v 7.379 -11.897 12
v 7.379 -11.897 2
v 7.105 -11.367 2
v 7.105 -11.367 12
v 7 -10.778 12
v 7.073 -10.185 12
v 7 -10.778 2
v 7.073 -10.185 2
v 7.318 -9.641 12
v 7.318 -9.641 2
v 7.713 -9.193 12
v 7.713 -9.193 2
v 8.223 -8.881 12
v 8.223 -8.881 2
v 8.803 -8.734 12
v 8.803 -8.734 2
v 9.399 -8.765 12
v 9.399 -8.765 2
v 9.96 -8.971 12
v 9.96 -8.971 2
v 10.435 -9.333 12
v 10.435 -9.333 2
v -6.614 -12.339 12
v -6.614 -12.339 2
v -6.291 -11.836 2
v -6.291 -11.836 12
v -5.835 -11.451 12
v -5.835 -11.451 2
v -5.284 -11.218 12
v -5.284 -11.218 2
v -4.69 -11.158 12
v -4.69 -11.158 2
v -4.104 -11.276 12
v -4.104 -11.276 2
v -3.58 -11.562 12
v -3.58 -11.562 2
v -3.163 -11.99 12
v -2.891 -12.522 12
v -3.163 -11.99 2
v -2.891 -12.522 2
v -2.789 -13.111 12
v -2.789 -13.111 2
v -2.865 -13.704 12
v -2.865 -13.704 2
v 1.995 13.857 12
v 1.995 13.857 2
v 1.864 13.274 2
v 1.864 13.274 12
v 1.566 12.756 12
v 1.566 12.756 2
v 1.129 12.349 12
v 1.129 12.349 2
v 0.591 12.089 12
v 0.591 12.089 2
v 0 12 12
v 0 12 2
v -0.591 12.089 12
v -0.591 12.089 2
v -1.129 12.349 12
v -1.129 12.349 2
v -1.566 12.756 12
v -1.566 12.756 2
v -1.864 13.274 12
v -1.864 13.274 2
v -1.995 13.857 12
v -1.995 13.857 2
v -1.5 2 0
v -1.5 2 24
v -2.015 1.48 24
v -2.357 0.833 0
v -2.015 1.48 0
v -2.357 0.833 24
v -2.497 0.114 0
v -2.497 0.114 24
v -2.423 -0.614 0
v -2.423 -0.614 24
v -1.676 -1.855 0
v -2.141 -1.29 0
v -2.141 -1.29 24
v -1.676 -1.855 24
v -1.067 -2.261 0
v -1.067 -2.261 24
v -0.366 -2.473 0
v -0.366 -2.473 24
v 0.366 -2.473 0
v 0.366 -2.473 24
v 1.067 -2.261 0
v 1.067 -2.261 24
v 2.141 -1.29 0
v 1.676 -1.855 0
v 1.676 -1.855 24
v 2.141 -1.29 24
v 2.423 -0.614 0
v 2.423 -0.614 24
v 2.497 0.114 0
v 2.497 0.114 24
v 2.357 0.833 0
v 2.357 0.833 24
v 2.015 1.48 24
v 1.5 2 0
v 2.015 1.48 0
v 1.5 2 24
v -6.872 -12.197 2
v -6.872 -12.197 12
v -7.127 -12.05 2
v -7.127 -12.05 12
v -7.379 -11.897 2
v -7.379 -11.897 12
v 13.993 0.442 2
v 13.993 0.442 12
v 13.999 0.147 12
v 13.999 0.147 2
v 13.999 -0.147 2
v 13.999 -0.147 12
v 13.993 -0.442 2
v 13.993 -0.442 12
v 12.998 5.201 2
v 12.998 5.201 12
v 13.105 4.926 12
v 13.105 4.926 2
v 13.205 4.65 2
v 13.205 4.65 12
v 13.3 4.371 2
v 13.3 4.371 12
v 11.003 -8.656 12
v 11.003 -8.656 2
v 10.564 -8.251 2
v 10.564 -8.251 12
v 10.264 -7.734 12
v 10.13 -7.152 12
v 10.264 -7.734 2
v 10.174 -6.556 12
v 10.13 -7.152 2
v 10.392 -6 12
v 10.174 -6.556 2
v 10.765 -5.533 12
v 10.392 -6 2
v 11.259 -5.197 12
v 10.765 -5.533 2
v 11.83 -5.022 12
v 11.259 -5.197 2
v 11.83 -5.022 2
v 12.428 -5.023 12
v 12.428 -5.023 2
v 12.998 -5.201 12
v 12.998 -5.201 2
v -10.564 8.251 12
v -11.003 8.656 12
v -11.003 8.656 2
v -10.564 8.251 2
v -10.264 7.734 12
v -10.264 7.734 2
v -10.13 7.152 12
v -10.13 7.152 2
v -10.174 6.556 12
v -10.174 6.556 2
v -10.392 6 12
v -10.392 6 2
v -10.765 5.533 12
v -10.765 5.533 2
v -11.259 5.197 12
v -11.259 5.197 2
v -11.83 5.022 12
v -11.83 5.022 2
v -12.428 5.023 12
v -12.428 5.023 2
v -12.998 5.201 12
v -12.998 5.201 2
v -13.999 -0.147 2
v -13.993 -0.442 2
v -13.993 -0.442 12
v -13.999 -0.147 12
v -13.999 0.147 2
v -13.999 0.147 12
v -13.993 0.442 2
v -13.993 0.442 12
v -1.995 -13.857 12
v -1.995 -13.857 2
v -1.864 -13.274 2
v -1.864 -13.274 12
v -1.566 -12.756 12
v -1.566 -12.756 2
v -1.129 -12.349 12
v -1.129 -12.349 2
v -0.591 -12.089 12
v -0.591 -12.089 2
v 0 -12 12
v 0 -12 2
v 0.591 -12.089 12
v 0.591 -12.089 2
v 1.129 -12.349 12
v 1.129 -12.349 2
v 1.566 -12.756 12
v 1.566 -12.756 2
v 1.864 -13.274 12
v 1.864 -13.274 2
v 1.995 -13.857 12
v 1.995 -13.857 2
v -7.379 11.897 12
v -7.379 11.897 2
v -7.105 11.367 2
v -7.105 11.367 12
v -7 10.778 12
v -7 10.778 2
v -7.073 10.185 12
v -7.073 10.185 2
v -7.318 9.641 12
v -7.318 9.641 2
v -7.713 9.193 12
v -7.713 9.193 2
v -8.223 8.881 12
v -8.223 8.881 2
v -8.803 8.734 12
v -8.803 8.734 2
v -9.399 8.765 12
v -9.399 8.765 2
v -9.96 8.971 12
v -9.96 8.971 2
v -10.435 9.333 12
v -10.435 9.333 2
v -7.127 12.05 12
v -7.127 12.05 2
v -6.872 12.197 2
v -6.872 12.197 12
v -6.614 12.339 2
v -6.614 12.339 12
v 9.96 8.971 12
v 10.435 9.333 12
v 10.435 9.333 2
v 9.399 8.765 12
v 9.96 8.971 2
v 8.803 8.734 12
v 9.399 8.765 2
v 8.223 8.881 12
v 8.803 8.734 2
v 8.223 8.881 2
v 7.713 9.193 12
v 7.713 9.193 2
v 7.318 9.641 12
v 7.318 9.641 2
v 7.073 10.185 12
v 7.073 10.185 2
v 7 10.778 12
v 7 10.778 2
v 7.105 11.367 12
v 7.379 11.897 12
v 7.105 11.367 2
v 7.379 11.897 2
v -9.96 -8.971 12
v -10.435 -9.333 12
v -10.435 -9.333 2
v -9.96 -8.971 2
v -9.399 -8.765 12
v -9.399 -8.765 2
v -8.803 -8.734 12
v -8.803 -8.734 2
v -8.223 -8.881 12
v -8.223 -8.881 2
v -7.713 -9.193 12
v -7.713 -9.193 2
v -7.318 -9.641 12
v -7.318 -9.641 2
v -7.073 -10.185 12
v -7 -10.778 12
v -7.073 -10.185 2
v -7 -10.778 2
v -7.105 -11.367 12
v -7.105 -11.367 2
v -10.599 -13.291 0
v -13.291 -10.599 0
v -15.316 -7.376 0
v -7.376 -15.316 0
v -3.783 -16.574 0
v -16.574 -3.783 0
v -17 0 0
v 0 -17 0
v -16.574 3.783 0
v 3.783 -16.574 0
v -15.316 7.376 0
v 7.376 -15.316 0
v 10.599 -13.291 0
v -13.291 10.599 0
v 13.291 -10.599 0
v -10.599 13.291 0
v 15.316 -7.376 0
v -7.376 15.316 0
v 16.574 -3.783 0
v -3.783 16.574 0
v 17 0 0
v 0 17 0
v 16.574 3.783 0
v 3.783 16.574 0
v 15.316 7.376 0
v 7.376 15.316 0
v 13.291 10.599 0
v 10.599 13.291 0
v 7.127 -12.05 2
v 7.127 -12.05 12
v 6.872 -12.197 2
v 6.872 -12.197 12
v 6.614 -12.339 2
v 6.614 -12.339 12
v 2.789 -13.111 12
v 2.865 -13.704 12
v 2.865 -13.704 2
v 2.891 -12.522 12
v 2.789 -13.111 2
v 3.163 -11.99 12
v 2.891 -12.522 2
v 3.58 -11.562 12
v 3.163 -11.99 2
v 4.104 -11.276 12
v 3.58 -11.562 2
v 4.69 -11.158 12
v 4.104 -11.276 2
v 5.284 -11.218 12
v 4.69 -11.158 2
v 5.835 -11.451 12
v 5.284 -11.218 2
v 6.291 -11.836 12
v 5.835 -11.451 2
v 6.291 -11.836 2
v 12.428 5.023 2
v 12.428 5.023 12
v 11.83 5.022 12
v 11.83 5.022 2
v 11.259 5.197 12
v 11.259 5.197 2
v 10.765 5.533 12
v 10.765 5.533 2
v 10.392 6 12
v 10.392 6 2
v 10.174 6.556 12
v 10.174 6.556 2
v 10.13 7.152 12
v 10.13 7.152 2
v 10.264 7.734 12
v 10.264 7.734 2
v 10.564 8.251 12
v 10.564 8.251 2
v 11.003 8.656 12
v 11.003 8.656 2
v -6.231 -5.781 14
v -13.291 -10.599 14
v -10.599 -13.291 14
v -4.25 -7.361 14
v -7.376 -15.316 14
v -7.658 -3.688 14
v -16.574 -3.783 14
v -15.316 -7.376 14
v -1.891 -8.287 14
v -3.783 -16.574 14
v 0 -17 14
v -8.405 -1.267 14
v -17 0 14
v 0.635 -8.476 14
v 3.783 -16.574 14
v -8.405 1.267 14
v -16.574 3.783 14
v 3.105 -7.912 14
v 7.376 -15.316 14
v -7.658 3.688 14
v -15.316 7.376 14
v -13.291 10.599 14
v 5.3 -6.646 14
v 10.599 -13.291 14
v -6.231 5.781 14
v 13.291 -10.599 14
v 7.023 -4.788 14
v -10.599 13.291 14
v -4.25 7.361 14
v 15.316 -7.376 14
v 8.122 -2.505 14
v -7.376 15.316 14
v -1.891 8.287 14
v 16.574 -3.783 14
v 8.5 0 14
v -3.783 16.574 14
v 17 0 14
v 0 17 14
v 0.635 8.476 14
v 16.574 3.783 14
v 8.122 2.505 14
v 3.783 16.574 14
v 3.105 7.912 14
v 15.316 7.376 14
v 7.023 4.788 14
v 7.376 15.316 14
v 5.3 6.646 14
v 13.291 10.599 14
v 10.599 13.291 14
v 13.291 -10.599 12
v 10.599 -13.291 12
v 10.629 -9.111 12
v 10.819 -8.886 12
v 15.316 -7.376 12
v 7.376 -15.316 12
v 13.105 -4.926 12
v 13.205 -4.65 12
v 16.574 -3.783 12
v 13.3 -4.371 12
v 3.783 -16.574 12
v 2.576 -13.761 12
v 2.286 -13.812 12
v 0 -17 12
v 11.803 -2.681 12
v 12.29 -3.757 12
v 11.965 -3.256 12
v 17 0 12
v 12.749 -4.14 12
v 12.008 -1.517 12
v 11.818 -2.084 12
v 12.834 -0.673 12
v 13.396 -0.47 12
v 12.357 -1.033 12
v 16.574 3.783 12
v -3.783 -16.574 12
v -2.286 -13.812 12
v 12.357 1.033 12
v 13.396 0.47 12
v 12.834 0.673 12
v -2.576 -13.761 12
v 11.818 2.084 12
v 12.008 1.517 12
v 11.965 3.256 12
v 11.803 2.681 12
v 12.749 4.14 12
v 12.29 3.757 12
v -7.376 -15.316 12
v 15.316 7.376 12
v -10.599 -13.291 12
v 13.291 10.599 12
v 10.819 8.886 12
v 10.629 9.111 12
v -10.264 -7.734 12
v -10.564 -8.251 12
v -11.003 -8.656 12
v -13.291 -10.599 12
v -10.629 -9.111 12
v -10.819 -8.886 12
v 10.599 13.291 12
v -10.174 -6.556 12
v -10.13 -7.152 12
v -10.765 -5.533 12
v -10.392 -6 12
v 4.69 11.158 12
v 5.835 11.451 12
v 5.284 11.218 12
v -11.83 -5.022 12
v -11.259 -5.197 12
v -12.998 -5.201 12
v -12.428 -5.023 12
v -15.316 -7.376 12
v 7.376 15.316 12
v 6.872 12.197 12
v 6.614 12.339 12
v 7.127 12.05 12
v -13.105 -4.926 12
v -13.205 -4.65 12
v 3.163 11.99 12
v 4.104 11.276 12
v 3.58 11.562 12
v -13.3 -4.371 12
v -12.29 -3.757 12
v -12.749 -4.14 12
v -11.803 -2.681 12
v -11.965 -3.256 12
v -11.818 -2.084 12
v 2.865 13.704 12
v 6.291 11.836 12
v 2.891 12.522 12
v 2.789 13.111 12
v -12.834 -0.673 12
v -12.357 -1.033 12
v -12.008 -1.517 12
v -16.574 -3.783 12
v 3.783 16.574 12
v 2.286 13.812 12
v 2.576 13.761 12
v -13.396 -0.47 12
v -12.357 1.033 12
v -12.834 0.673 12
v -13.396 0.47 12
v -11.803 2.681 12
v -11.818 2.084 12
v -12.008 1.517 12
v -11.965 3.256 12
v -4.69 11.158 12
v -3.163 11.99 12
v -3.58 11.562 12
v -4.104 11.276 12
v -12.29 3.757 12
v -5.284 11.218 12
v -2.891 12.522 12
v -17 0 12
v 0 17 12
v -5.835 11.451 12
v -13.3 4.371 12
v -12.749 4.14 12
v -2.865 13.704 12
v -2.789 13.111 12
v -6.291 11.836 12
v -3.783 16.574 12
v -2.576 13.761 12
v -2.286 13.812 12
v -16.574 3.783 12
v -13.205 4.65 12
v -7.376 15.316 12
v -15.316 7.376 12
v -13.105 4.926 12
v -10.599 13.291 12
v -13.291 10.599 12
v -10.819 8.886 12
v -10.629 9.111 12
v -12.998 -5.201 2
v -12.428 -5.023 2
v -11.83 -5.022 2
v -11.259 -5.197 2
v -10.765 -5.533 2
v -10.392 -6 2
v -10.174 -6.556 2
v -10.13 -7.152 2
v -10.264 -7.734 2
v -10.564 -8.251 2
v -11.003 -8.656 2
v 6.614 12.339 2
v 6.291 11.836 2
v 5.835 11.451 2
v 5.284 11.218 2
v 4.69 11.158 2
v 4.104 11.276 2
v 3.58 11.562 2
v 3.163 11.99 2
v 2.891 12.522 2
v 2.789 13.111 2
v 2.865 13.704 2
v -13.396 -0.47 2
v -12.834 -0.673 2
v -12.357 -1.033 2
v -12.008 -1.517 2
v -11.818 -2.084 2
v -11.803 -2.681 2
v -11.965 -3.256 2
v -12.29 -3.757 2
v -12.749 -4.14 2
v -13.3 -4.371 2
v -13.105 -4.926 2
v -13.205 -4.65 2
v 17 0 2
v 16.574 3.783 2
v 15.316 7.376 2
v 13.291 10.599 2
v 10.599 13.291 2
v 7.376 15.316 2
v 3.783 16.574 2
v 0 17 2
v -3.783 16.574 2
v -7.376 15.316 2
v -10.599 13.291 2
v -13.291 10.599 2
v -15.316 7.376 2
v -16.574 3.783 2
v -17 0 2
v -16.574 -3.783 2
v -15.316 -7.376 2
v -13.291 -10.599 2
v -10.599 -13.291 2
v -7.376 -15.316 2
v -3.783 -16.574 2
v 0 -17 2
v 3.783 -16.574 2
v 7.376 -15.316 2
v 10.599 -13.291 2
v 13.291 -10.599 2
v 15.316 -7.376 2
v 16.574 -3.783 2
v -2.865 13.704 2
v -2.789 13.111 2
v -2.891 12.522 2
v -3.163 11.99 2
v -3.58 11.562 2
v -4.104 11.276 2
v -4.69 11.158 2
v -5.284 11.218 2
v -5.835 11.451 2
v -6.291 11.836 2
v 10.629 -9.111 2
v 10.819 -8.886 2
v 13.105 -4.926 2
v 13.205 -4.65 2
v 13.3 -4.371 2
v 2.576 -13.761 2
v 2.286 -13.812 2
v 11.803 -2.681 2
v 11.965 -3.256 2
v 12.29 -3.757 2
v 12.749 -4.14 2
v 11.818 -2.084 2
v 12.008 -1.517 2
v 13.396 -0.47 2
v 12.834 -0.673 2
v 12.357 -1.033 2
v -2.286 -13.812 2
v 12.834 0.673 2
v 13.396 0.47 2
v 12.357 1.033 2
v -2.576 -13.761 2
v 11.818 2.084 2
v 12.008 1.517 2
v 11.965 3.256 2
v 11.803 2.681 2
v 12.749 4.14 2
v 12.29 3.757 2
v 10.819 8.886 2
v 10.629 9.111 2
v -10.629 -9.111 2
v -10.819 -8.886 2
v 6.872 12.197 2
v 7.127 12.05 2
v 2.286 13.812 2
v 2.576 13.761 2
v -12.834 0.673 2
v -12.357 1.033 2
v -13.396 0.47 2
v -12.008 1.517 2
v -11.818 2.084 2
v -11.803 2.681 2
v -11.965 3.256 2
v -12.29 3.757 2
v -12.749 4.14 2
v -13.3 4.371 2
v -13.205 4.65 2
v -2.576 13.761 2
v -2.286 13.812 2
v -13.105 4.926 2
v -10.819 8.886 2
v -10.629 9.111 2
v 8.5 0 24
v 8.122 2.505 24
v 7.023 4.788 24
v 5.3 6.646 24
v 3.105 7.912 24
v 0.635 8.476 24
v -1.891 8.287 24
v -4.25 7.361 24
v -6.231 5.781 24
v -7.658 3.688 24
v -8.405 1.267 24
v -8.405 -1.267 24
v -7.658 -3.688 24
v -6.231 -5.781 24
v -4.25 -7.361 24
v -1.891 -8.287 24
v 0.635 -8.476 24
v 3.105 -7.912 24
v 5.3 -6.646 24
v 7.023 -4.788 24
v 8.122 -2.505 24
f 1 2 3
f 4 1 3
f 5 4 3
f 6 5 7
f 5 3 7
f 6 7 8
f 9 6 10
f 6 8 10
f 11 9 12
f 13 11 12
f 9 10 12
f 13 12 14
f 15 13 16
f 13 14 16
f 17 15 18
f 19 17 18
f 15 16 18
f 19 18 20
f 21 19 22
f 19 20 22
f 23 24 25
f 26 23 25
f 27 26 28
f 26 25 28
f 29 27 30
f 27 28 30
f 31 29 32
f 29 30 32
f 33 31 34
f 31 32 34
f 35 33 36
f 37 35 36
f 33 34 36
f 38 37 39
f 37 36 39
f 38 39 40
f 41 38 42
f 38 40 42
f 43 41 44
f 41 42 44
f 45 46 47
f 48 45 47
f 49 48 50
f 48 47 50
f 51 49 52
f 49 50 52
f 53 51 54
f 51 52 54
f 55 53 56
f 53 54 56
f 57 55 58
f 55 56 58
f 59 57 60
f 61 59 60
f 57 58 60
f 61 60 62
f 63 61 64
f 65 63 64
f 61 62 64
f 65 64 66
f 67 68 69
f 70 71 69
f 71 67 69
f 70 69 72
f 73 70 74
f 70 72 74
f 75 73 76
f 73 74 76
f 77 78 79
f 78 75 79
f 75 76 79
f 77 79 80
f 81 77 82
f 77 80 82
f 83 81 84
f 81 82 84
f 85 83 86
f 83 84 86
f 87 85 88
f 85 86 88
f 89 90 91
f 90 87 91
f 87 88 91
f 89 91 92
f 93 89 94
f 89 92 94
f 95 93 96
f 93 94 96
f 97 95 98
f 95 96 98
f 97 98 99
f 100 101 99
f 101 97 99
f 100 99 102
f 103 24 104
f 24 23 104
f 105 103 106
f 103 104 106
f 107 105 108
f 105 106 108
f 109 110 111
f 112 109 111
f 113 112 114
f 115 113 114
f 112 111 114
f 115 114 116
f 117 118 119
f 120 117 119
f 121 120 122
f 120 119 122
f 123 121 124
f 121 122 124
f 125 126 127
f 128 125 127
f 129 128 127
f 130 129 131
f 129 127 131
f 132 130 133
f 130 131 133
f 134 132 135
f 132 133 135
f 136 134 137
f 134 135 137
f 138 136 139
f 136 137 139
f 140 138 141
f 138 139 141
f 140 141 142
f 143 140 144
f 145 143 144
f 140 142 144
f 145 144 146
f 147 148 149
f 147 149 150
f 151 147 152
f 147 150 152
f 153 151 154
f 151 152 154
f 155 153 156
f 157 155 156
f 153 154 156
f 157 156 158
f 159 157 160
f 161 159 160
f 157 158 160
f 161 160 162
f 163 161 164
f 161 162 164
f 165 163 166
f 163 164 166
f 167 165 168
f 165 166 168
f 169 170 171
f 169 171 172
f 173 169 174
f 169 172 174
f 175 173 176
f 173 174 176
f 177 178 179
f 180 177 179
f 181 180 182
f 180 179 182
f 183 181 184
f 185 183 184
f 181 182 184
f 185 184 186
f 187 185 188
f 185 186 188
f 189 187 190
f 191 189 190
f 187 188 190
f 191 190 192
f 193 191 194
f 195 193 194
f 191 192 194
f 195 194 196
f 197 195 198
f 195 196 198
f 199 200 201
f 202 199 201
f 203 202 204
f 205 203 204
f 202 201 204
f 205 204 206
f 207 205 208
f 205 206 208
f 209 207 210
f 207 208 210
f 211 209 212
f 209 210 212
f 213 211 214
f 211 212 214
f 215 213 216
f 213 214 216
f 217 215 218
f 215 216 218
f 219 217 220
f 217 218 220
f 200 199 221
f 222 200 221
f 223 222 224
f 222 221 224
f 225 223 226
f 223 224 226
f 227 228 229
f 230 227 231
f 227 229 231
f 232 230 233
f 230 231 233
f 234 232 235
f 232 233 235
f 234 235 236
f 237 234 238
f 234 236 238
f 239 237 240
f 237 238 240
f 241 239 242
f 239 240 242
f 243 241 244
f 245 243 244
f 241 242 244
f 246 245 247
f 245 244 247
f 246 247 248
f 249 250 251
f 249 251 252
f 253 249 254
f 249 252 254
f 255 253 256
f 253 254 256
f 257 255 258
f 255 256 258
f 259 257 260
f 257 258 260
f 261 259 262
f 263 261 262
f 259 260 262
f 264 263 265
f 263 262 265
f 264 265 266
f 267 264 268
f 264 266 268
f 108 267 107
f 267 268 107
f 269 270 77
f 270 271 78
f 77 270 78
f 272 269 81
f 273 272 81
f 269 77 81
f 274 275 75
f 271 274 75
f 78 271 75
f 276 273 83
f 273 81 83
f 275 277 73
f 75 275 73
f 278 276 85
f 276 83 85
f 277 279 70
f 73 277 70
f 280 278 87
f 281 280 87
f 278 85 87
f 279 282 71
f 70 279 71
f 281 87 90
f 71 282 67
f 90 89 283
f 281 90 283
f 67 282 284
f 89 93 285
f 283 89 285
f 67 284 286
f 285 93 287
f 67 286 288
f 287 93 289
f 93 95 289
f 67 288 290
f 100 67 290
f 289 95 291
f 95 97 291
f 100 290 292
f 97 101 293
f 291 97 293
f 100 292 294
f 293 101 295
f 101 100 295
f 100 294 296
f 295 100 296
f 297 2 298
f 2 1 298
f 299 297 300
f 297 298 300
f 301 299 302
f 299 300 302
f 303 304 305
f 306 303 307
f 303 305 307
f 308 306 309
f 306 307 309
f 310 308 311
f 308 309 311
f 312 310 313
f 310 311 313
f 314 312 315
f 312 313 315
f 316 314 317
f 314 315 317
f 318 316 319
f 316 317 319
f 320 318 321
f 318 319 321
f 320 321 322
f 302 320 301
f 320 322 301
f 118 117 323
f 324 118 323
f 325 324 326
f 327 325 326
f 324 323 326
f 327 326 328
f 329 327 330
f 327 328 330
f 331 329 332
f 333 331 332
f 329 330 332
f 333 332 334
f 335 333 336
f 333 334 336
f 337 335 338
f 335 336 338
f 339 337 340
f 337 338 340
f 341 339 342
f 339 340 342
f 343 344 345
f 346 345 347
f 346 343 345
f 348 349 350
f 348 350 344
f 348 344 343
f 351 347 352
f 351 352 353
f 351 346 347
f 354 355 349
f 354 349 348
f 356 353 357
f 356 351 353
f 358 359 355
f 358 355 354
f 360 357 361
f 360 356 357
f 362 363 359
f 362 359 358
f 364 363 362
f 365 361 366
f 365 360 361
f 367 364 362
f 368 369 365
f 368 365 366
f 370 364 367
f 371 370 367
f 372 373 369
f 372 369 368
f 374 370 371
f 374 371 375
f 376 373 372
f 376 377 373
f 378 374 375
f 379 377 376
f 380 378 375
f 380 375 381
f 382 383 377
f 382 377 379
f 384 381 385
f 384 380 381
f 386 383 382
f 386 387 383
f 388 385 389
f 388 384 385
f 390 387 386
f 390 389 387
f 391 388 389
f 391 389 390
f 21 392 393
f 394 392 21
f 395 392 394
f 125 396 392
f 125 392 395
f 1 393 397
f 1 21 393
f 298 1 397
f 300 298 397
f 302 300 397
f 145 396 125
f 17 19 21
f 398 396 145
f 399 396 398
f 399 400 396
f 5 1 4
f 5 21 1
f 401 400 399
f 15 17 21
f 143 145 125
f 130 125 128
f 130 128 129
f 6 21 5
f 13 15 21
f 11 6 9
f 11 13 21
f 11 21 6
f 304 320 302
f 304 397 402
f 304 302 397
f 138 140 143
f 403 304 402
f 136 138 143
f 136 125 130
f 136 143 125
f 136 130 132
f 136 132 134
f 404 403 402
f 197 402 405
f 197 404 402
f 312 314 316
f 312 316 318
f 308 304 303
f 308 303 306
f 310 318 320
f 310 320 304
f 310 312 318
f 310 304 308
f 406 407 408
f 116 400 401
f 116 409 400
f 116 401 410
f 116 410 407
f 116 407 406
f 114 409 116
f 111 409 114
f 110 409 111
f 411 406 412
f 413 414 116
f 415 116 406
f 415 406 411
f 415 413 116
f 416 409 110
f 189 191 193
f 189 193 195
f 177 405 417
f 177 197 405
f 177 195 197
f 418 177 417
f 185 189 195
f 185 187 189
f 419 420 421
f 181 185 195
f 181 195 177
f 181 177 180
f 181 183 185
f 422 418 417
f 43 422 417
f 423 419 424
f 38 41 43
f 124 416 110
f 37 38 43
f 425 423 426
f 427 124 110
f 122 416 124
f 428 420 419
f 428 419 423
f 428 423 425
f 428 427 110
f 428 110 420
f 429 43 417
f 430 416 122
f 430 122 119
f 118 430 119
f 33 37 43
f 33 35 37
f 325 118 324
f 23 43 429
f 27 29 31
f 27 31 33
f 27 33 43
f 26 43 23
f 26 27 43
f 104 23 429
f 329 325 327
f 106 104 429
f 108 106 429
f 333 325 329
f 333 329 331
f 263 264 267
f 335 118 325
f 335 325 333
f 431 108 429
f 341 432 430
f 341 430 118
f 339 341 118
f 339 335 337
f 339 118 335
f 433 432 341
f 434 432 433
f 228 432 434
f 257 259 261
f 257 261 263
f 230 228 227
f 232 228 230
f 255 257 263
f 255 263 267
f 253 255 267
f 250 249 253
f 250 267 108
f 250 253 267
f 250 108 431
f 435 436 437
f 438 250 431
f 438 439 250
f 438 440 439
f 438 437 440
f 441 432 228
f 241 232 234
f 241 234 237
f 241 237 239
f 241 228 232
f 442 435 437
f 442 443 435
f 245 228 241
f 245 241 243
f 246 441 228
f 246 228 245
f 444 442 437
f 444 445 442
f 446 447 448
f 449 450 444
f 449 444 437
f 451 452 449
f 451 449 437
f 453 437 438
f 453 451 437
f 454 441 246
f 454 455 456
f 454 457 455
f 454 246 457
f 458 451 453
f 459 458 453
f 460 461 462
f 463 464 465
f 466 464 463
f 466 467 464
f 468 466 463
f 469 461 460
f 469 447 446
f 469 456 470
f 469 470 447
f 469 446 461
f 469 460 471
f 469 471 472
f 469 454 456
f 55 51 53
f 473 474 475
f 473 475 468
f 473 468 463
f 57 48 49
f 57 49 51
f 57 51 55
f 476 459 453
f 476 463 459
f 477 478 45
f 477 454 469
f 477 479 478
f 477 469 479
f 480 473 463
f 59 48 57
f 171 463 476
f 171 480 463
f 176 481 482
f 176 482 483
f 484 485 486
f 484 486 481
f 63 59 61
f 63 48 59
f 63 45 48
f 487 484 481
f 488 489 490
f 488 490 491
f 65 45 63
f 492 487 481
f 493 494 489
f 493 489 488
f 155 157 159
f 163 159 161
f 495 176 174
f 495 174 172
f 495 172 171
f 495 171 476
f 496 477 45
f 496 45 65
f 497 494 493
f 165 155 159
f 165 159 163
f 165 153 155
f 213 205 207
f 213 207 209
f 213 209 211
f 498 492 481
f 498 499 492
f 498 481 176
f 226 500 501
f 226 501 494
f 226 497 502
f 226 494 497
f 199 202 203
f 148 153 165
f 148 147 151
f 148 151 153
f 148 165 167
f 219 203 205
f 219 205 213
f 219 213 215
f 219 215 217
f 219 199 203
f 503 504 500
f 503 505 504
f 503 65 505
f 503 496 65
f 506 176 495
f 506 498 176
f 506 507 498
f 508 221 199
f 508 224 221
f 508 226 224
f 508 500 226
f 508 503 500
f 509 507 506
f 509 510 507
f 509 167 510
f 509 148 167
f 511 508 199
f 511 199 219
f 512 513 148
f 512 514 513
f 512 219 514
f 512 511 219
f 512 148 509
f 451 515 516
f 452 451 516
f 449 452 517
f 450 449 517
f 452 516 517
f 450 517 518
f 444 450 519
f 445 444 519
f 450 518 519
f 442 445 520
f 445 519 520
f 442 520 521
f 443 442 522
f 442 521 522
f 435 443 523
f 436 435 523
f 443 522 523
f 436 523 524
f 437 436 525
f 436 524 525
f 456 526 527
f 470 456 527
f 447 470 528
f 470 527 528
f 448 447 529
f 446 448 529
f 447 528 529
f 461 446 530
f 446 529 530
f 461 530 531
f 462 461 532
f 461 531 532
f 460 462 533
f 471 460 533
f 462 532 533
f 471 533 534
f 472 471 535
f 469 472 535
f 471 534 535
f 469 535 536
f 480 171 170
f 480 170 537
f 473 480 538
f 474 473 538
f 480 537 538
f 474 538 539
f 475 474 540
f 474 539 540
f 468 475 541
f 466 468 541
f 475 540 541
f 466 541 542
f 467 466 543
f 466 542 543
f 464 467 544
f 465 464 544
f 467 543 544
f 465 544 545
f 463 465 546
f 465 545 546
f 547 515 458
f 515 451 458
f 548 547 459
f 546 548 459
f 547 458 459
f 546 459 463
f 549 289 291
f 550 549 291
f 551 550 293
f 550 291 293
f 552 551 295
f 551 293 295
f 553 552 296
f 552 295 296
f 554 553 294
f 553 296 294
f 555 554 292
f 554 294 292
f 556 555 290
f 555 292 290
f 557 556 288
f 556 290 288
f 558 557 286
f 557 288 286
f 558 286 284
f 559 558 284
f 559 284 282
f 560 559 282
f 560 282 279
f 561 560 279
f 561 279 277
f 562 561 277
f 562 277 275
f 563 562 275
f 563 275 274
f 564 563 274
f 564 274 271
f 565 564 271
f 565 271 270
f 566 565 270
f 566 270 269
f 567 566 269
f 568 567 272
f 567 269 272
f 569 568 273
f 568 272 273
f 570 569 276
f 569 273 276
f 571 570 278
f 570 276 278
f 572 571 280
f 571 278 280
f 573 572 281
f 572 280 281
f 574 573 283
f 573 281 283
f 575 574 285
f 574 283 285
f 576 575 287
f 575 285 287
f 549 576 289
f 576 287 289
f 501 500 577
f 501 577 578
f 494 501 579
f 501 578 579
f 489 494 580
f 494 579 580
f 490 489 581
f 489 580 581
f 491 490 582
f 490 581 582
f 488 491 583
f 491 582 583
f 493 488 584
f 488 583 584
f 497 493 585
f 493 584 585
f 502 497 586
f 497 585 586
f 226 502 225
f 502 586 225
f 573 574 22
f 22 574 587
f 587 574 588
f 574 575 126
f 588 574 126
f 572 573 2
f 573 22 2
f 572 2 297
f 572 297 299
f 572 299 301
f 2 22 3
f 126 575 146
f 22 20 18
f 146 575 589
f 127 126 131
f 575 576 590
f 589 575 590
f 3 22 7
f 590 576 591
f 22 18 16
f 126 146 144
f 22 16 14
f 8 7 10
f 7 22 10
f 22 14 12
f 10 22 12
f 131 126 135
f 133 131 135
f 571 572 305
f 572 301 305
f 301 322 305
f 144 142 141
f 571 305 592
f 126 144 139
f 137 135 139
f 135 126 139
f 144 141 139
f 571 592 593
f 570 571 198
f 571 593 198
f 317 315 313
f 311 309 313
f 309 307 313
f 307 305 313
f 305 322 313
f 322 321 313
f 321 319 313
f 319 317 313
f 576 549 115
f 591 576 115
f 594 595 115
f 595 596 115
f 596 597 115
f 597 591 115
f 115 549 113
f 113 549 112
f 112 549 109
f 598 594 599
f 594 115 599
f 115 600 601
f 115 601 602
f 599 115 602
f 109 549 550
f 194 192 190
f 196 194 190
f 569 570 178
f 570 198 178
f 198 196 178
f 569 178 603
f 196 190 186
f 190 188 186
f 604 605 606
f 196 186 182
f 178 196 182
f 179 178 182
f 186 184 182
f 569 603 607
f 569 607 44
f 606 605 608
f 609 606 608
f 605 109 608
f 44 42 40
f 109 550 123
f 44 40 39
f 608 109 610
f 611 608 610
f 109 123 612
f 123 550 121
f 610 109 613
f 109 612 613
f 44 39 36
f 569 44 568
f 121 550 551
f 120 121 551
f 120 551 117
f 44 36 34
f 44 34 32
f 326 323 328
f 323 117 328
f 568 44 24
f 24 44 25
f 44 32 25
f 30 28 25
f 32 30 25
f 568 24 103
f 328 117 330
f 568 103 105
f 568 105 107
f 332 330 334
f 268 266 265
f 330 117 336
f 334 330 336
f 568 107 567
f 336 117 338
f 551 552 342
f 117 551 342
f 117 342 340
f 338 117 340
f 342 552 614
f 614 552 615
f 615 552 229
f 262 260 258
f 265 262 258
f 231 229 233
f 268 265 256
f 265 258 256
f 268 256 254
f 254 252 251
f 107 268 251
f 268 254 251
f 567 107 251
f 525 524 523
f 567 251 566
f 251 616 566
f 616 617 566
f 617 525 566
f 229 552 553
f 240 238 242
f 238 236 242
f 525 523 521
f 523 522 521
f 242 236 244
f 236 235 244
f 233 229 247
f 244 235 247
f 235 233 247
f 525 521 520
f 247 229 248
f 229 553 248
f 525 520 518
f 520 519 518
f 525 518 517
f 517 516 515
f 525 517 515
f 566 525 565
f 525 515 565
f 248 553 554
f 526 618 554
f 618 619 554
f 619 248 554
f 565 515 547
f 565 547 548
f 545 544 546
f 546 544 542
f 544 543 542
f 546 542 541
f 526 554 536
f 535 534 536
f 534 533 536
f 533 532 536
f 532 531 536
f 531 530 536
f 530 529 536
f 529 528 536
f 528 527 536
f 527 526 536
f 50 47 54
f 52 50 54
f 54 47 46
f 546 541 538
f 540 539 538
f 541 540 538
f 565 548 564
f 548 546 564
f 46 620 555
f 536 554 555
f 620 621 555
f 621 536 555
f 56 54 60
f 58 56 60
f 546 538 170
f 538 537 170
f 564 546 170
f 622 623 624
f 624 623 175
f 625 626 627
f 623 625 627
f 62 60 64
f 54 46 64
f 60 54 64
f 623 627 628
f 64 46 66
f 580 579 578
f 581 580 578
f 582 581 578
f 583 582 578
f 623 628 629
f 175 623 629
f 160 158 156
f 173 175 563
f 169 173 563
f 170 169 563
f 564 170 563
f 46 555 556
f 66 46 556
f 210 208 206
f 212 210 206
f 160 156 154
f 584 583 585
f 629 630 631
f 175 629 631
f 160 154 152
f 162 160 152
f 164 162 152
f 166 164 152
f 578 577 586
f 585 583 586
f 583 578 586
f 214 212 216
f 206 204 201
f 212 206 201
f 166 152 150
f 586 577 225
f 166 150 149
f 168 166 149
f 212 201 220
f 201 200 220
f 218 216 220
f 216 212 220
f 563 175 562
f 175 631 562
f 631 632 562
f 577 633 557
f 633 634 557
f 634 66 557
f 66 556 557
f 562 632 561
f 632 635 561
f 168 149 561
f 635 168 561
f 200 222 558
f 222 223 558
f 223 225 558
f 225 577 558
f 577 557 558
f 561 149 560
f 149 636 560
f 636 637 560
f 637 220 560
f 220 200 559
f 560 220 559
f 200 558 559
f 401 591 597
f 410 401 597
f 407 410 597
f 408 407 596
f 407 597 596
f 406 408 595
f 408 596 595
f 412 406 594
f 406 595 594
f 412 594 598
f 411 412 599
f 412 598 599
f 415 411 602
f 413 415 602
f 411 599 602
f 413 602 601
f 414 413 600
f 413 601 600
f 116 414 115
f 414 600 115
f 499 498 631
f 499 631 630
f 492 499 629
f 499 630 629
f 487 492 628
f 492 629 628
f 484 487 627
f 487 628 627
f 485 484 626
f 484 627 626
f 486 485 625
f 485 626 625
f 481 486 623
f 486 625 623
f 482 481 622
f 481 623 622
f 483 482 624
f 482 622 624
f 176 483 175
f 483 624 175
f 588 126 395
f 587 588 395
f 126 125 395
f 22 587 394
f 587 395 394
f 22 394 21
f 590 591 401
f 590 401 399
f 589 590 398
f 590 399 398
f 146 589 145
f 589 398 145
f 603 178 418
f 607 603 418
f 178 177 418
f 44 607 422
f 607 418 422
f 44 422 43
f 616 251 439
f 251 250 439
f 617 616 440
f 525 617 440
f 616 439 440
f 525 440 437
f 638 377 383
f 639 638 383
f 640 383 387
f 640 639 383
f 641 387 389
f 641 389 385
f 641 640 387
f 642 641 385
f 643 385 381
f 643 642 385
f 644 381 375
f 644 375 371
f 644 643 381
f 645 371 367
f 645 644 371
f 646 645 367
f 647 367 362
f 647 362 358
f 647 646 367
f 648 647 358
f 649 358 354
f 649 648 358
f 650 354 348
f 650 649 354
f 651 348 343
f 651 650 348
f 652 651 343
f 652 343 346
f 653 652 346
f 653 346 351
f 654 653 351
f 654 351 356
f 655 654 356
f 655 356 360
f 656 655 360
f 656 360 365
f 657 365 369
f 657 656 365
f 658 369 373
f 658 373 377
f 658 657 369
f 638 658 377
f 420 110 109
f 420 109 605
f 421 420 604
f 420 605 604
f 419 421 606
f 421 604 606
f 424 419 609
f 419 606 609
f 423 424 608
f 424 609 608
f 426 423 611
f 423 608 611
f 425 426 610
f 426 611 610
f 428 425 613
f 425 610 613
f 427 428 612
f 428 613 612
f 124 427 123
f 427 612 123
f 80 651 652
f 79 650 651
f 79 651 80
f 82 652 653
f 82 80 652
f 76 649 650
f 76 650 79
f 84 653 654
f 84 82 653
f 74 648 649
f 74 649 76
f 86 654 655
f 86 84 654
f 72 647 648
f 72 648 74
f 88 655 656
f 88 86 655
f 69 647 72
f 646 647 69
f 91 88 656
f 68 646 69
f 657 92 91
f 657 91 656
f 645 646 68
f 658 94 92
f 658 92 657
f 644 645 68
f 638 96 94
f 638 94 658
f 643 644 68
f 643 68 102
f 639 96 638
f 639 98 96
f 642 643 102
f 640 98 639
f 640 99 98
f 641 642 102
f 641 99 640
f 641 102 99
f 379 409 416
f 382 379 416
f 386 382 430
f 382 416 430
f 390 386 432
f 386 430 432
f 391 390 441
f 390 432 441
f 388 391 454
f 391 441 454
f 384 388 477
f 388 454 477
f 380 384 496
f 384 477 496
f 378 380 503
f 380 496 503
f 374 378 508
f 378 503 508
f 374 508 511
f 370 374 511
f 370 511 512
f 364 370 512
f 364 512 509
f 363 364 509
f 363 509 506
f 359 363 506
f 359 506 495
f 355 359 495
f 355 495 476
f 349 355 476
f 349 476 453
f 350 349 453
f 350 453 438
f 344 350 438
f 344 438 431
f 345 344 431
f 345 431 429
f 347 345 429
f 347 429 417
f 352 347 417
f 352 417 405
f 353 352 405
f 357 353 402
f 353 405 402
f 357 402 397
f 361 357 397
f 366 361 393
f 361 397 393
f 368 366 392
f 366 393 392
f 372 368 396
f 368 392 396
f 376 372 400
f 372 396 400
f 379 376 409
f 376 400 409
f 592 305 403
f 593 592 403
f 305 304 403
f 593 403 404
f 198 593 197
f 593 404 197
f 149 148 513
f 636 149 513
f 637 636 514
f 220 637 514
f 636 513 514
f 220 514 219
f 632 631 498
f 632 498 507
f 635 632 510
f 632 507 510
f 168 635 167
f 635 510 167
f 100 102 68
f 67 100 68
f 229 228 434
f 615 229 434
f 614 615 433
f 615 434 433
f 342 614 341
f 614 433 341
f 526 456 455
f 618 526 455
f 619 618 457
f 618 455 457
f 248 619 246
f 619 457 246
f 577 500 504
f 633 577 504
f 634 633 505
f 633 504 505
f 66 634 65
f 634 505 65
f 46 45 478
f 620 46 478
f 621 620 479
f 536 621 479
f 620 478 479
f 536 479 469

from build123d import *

# Parameters (mm, degrees)
SKETCH1_R           = 17
BOSS_EXTRUDE1_DEPTH = 14
CUT_EXTRUDE2_REACH  = 29.821
SKETCH3_R           = 2.5
BOSS_EXTRUDE2_START = 10
SKETCH5_R           = 8.5
SKETCH5_R_2         = 2.5
BOSS_EXTRUDE2_DEPTH = 10
BOSS_EXTRUDE3_DEPTH = 24
SKETCH7_R           = 17
SKETCH7_R_2         = 14
CUT_EXTRUDE5_DEPTH  = 5
SKETCH8_R           = 2
CUT_EXTRUDE6_DEPTH  = 5


with BuildPart() as part:
    # Sketch1 → Boss-Extrude1 (new body)
    with BuildSketch(Plane.XY):
        Circle(SKETCH1_R)
    extrude(amount=BOSS_EXTRUDE1_DEPTH)

    # Sketch3 → Cut-Extrude2 (cut, up to next)
    with BuildSketch(Plane.XY.offset(14), mode=Mode.PRIVATE) as cut_extrude2_sk1:
        Circle(SKETCH3_R)
    cut_extrude2_tool1 = extrude(cut_extrude2_sk1.sketch, amount=-CUT_EXTRUDE2_REACH, mode=Mode.PRIVATE) & part.part
    add(cut_extrude2_tool1.solids().sort_by_distance((0, 0, 14))[0], mode=Mode.SUBTRACT)

    # Sketch5 → Boss-Extrude2 (add)
    with BuildSketch(Plane.XY.offset(14).offset(BOSS_EXTRUDE2_START)):
        Circle(SKETCH5_R)
        Circle(SKETCH5_R_2, mode=Mode.SUBTRACT)
    extrude(amount=-BOSS_EXTRUDE2_DEPTH)

    # Sketch6 → Boss-Extrude3 (add)
    with BuildSketch(Plane.XY.offset(24)):
        with BuildLine():
            Line((1.5, 2), (-1.5, 2))
            ThreePointArc((-1.5, 2), (0, 2.5), (1.5, 2))
        make_face()
    extrude(amount=-BOSS_EXTRUDE3_DEPTH)

    # Sketch7 → Cut-Extrude5 (cut, symmetric)
    with BuildSketch(Plane(origin=(0, 0, 7), x_dir=(-1, 0, 0), z_dir=(0, 0, -1))):
        Circle(SKETCH7_R)
        Circle(SKETCH7_R_2, mode=Mode.SUBTRACT)
    extrude(amount=CUT_EXTRUDE5_DEPTH, both=True, mode=Mode.SUBTRACT)

    # Sketch8 → Cut-Extrude6 (cut, symmetric)
    with BuildSketch(Plane(origin=(0, 0, 7), x_dir=(-1, 0, 0), z_dir=(0, 0, -1))):
        with Locations((0, 14)):
            Circle(SKETCH8_R)
        with Locations((4.788282007, 13.155696691)):
            Circle(SKETCH8_R)
        with Locations((8.999026536, 10.724622204)):
            Circle(SKETCH8_R)
        with Locations((12.124355653, 7)):
            Circle(SKETCH8_R)
        with Locations((13.787308542, 2.431074487)):
            Circle(SKETCH8_R)
        with Locations((13.787308542, -2.431074487)):
            Circle(SKETCH8_R)
        with Locations((12.124355653, -7)):
            Circle(SKETCH8_R)
        with Locations((8.999026536, -10.724622204)):
            Circle(SKETCH8_R)
        with Locations((4.788282007, -13.155696691)):
            Circle(SKETCH8_R)
        with Locations((0, -14)):
            Circle(SKETCH8_R)
        with Locations((-4.788282007, -13.155696691)):
            Circle(SKETCH8_R)
        with Locations((-8.999026536, -10.724622204)):
            Circle(SKETCH8_R)
        with Locations((-12.124355653, -7)):
            Circle(SKETCH8_R)
        with Locations((-13.787308542, -2.431074487)):
            Circle(SKETCH8_R)
        with Locations((-13.787308542, 2.431074487)):
            Circle(SKETCH8_R)
        with Locations((-12.124355653, 7)):
            Circle(SKETCH8_R)
        with Locations((-8.999026536, 10.724622204)):
            Circle(SKETCH8_R)
        with Locations((-4.788282007, 13.155696691)):
            Circle(SKETCH8_R)
    extrude(amount=CUT_EXTRUDE6_DEPTH, both=True, mode=Mode.SUBTRACT)


solid = part.part
